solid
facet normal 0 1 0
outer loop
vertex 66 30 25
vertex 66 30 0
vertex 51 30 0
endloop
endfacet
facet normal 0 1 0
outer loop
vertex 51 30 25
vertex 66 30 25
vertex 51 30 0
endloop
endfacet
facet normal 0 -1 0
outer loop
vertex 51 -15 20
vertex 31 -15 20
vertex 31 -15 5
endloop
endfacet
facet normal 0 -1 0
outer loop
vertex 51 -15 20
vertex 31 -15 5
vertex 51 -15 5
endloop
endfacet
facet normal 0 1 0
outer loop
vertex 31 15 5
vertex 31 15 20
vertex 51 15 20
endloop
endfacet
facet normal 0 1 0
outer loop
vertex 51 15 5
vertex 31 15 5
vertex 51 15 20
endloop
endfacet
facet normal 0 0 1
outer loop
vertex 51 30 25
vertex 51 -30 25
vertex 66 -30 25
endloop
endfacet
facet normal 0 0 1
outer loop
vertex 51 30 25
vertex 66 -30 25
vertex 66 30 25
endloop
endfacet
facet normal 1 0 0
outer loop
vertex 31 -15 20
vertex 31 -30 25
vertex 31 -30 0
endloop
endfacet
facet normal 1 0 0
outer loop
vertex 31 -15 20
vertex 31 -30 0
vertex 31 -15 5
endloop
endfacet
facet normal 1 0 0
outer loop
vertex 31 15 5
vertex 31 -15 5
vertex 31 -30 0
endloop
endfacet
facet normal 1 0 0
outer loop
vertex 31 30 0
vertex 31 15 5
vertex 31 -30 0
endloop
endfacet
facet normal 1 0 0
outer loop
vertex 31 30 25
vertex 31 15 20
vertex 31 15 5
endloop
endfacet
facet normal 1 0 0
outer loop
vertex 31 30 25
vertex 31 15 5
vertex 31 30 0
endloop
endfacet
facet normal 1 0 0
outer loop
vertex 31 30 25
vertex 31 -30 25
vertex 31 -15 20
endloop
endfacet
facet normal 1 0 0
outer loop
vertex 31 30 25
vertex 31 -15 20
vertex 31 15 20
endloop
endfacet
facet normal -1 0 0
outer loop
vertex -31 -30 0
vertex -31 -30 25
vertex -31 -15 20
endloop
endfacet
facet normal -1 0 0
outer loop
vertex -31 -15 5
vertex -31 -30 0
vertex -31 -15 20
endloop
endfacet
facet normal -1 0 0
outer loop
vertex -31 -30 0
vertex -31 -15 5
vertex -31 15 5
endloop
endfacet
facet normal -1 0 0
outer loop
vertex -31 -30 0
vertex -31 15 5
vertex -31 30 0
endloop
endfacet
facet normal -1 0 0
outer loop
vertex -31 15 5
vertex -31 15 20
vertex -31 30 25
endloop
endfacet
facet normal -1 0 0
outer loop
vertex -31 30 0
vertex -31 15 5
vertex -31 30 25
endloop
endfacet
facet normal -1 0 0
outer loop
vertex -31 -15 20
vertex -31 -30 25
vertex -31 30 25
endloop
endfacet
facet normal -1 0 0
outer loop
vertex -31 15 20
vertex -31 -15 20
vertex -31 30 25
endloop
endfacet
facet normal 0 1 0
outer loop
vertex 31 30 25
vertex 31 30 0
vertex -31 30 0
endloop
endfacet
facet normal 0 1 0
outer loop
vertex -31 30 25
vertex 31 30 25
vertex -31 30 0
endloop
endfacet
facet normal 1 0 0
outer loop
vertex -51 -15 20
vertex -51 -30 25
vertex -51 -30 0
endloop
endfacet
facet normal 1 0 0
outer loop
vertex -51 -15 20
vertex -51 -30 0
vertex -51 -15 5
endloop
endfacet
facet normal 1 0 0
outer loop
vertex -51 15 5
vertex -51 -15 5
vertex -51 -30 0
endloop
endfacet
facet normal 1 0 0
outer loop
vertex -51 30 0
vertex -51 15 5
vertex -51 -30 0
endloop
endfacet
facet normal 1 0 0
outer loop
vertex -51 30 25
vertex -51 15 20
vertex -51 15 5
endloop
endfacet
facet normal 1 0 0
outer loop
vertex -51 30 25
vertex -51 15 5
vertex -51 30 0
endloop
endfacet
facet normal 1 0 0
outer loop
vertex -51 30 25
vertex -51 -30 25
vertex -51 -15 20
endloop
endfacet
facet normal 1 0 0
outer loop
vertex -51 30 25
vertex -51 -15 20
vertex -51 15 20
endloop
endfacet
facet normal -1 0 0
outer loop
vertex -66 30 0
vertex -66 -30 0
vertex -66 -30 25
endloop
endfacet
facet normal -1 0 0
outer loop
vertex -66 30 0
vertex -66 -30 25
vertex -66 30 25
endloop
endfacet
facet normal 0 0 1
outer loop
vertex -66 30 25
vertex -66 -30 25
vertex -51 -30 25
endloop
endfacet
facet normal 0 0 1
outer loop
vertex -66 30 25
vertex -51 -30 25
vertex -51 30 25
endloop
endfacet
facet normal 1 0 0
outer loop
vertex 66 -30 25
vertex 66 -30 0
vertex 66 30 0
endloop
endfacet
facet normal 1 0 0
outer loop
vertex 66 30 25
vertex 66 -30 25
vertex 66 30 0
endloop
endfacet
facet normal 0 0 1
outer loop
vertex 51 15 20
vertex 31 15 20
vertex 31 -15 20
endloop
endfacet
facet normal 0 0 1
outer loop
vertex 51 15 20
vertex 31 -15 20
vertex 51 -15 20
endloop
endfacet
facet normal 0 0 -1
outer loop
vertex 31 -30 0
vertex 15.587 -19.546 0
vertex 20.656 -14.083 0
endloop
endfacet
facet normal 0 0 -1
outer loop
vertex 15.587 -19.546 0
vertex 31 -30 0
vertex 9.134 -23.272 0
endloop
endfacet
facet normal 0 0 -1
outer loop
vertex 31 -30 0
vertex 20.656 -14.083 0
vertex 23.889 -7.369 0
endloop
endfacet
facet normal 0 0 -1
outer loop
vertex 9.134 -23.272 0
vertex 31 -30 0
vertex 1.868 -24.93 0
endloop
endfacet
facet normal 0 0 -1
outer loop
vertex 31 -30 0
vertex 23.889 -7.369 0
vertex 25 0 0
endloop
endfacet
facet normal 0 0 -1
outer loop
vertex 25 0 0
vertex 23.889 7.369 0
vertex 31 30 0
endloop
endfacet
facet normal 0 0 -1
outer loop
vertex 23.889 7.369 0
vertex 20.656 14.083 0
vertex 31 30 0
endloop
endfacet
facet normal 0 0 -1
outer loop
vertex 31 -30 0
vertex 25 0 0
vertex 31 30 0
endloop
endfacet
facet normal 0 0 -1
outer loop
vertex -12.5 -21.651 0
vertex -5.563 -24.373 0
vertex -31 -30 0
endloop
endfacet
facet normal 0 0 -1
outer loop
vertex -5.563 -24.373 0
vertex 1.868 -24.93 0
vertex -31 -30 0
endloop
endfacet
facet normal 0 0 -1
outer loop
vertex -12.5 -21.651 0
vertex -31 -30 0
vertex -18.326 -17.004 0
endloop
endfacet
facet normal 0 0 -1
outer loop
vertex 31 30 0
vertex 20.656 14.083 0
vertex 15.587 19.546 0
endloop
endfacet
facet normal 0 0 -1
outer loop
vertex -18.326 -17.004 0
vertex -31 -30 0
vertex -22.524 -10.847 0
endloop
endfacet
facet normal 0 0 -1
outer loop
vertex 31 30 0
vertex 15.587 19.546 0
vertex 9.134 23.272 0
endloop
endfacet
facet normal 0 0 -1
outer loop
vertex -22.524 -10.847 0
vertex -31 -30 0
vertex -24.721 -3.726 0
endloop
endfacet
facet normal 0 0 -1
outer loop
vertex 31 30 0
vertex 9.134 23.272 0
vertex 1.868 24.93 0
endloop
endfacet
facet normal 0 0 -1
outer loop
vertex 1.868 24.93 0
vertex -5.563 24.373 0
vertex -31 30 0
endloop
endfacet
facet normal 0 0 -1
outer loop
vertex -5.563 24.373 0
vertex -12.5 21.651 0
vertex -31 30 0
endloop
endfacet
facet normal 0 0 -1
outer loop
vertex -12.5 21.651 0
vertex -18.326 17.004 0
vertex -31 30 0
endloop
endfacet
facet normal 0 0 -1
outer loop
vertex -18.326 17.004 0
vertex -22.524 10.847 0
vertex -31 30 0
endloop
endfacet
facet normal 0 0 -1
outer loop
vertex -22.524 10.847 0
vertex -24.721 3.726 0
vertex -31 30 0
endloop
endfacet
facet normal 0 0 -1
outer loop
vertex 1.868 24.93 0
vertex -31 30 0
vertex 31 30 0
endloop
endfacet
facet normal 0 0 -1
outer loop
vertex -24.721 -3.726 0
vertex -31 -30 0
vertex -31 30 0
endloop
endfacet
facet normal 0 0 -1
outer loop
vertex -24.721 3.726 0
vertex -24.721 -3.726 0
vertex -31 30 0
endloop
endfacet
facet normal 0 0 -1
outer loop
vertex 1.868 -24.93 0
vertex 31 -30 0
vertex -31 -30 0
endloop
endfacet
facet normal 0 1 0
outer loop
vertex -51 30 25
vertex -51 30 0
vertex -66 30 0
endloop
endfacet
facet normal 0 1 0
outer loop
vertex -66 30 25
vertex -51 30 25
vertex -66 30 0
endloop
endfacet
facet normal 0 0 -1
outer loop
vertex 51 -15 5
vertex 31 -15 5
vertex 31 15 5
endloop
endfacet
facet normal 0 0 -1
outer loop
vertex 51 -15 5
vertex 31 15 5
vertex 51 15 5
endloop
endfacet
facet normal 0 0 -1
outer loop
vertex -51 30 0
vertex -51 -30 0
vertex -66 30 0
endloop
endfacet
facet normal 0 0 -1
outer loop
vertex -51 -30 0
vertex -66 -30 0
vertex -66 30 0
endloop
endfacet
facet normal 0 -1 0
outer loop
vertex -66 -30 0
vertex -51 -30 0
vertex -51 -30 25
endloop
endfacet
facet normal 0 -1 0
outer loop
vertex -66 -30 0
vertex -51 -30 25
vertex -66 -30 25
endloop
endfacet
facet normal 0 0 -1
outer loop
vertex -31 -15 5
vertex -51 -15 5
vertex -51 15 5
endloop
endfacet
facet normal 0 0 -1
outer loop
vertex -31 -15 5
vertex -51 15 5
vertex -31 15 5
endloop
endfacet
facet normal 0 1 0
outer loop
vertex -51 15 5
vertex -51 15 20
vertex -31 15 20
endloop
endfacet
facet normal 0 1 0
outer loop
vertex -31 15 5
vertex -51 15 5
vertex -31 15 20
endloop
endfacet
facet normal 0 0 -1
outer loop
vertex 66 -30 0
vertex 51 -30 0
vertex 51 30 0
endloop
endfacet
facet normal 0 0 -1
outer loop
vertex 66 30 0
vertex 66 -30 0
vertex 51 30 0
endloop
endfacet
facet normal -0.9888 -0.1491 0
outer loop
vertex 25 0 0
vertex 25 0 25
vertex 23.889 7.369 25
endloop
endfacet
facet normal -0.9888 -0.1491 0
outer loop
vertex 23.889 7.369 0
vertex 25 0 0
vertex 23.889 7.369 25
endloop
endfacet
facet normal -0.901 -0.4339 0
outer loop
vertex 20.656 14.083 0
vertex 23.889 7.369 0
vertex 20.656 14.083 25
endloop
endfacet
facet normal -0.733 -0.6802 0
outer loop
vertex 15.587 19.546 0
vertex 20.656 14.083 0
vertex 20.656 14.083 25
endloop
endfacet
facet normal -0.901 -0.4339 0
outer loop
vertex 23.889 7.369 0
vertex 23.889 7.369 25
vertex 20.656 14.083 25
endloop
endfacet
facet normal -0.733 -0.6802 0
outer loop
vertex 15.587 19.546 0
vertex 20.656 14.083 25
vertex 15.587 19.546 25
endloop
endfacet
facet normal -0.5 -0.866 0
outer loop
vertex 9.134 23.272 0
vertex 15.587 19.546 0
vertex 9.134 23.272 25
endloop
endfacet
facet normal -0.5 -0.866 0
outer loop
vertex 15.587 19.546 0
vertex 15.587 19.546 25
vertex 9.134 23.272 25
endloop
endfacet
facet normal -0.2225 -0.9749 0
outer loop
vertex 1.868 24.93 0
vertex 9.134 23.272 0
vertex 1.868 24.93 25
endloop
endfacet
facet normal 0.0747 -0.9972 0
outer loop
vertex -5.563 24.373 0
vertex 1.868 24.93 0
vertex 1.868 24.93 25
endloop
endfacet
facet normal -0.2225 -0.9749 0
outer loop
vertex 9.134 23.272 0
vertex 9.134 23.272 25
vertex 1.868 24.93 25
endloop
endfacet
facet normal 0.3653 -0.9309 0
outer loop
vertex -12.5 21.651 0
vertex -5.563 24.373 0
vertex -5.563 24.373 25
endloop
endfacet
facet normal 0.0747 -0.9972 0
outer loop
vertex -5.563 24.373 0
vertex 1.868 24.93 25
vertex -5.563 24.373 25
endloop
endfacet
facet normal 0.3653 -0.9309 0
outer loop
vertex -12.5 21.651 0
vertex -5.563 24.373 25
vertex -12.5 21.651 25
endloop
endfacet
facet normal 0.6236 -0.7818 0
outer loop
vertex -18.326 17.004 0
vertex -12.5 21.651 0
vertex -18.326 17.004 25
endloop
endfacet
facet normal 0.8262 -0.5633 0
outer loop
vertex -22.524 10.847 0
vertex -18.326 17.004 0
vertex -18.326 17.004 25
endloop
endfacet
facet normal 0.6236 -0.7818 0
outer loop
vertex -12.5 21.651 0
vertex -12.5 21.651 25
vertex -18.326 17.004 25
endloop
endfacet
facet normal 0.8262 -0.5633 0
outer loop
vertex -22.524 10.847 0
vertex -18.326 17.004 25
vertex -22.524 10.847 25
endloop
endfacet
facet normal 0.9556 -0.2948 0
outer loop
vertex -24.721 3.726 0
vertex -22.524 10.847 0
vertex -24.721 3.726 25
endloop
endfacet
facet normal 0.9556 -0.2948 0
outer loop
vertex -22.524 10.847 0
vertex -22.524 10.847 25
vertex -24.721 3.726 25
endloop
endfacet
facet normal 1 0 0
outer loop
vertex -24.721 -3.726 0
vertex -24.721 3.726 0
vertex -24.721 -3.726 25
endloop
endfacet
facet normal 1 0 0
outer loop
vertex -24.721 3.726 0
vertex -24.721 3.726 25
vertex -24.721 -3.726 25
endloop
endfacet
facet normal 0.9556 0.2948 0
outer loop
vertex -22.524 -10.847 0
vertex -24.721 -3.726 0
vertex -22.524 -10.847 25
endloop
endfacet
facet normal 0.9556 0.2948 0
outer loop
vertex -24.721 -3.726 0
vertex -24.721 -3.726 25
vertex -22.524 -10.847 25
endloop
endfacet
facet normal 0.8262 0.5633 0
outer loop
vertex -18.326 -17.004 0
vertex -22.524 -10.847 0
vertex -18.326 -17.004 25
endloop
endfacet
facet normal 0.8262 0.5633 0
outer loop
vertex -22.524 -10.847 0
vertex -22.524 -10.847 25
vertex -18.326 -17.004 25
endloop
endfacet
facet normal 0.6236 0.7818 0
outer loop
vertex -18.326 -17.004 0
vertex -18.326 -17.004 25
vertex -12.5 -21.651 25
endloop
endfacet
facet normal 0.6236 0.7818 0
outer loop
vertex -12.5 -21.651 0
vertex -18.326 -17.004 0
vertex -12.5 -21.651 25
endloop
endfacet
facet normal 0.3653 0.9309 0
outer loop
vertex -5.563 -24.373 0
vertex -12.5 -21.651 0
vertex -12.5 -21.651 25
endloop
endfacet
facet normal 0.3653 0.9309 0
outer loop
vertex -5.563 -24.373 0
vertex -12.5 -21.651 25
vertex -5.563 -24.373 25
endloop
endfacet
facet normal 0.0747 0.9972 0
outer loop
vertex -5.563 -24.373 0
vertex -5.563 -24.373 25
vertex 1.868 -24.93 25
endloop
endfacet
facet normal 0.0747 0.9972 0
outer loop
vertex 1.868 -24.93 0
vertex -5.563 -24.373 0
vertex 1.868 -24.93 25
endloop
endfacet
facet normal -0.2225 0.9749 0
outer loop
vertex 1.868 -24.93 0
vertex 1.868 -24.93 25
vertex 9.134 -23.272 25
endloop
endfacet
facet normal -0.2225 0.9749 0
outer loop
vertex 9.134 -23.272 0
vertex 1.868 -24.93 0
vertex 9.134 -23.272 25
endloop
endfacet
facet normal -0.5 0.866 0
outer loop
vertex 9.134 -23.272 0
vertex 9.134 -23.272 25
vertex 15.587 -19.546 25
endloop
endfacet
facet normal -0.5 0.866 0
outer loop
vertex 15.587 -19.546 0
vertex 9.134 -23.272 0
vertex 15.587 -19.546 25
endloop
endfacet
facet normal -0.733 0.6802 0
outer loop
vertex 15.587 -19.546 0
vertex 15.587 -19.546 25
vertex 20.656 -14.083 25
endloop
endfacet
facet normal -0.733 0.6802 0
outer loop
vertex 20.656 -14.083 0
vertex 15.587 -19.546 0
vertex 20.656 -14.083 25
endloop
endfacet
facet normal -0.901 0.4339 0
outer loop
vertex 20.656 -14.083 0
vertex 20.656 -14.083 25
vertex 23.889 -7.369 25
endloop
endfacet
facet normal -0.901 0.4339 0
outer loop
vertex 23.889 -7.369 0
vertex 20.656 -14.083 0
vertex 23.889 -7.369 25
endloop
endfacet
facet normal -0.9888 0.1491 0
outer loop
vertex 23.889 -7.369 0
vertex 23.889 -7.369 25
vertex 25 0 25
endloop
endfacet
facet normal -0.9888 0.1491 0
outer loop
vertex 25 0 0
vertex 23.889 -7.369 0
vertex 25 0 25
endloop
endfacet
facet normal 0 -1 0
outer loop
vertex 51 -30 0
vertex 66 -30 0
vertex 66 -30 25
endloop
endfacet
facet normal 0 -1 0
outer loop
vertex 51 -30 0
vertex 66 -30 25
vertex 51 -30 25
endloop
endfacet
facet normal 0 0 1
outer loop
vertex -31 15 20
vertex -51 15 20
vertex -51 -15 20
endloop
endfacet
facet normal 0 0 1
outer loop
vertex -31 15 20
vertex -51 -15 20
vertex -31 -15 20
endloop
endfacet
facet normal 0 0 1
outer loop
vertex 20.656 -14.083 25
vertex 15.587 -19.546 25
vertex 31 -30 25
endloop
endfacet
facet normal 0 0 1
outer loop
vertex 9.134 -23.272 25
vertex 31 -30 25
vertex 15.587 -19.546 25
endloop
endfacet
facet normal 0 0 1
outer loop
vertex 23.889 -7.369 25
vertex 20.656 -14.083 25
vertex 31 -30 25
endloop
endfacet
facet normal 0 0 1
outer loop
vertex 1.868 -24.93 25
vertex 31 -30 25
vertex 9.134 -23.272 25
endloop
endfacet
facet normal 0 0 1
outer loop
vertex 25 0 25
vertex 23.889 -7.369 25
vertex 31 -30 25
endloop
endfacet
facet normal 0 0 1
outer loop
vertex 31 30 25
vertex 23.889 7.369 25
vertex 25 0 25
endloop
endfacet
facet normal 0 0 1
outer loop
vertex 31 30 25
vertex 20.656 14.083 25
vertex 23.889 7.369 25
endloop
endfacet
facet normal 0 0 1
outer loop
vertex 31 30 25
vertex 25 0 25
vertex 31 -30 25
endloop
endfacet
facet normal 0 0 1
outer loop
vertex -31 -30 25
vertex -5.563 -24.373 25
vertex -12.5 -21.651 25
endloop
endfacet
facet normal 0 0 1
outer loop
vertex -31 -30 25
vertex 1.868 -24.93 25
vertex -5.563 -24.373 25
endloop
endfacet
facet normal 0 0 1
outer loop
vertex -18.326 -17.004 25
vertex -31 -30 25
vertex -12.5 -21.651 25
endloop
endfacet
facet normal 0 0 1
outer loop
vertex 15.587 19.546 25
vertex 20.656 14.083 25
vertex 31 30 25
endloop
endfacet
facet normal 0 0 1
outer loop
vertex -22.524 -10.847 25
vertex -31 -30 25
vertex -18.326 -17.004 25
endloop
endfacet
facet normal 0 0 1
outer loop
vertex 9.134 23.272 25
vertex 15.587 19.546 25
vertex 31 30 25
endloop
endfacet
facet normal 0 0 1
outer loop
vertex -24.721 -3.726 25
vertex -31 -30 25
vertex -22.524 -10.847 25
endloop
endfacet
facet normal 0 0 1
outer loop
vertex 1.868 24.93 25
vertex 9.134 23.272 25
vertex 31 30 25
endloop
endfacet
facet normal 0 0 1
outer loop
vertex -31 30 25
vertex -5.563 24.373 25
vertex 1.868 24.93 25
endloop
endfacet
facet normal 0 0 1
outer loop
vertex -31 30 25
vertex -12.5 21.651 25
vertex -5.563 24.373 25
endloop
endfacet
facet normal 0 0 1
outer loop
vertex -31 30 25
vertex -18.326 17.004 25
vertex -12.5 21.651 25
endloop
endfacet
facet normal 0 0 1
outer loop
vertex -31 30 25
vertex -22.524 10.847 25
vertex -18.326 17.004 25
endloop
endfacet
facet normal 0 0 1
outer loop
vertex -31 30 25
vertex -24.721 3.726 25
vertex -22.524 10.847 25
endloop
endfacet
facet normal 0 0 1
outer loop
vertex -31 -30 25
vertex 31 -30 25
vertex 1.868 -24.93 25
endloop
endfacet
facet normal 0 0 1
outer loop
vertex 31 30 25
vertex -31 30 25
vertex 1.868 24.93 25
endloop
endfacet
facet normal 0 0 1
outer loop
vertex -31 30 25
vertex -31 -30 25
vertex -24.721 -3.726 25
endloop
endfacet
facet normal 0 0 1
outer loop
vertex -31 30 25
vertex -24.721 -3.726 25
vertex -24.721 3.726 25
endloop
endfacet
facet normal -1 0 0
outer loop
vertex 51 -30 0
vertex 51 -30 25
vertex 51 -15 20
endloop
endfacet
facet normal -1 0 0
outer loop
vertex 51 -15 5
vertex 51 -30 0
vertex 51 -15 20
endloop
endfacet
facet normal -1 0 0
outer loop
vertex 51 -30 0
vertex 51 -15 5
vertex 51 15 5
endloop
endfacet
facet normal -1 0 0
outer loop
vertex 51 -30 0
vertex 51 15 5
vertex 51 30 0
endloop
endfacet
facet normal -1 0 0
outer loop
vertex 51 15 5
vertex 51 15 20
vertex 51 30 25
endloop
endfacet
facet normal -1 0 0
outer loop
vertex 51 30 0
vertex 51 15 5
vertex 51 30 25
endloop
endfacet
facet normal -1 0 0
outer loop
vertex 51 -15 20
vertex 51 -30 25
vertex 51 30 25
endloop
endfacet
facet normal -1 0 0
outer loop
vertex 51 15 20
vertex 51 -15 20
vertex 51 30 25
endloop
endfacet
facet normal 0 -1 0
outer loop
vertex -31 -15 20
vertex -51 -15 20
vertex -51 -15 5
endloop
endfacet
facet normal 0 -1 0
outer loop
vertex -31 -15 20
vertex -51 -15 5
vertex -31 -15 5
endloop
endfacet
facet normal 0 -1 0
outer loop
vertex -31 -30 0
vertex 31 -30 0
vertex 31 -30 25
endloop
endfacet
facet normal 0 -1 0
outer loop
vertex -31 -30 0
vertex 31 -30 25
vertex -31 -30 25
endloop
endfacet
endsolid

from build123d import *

# Parameters (mm, degrees)
SKETCH1_W           = 60
SKETCH1_H           = 132
BOSS_EXTRUDE1_DEPTH = 25
SKETCH2_W           = 20
SKETCH2_H           = 15
CUT_EXTRUDE1_DEPTH  = 77.68767828
SKETCH4_W           = 20
SKETCH4_H           = 30
CUT_EXTRUDE2_DEPTH  = 5
SKETCH5_W           = 20
SKETCH5_H           = 30
CUT_EXTRUDE3_DEPTH  = 5
SKETCH6_R           = 25
CUT_EXTRUDE4_DEPTH  = 77.68767828


with BuildPart() as part:
    # Sketch1 → Boss-Extrude1 (new body)
    with BuildSketch(Plane(origin=(0, 0, 0), x_dir=(0, 1, 0), z_dir=(0, 0, 1))):
        Rectangle(SKETCH1_W, SKETCH1_H)
    extrude(amount=BOSS_EXTRUDE1_DEPTH)

    # Sketch2 → Cut-Extrude1 (cut, through all)
    with BuildSketch(Plane.XY.offset(25)):
        with Locations((-41, 22.5)):
            Rectangle(SKETCH2_W, SKETCH2_H)
        with Locations((41, 22.5)):
            Rectangle(SKETCH2_W, SKETCH2_H)
        with Locations((41, -22.5)):
            Rectangle(SKETCH2_W, SKETCH2_H)
        with Locations((-41, -22.5)):
            Rectangle(SKETCH2_W, SKETCH2_H)
    extrude(amount=-CUT_EXTRUDE1_DEPTH, mode=Mode.SUBTRACT)

    # Sketch4 → Cut-Extrude2 (cut)
    with BuildSketch(Plane.XY.offset(25)):
        with Locations((-41, 0)):
            Rectangle(SKETCH4_W, SKETCH4_H)
        with Locations((41, 0)):
            Rectangle(SKETCH4_W, SKETCH4_H)
    extrude(amount=-CUT_EXTRUDE2_DEPTH, mode=Mode.SUBTRACT)

    # Sketch5 → Cut-Extrude3 (cut)
    with BuildSketch(Plane(origin=(0, 0, 0), x_dir=(1, 0, 0), z_dir=(0, 0, -1))):
        with Locations((-41, 0)):
            Rectangle(SKETCH5_W, SKETCH5_H)
        with Locations((41, 0)):
            Rectangle(SKETCH5_W, SKETCH5_H)
    extrude(amount=-CUT_EXTRUDE3_DEPTH, mode=Mode.SUBTRACT)

    # Sketch6 → Cut-Extrude4 (cut, through all)
    with BuildSketch(Plane.XY.offset(25)):
        Circle(SKETCH6_R)
    extrude(amount=-CUT_EXTRUDE4_DEPTH, mode=Mode.SUBTRACT)


solid = part.part
